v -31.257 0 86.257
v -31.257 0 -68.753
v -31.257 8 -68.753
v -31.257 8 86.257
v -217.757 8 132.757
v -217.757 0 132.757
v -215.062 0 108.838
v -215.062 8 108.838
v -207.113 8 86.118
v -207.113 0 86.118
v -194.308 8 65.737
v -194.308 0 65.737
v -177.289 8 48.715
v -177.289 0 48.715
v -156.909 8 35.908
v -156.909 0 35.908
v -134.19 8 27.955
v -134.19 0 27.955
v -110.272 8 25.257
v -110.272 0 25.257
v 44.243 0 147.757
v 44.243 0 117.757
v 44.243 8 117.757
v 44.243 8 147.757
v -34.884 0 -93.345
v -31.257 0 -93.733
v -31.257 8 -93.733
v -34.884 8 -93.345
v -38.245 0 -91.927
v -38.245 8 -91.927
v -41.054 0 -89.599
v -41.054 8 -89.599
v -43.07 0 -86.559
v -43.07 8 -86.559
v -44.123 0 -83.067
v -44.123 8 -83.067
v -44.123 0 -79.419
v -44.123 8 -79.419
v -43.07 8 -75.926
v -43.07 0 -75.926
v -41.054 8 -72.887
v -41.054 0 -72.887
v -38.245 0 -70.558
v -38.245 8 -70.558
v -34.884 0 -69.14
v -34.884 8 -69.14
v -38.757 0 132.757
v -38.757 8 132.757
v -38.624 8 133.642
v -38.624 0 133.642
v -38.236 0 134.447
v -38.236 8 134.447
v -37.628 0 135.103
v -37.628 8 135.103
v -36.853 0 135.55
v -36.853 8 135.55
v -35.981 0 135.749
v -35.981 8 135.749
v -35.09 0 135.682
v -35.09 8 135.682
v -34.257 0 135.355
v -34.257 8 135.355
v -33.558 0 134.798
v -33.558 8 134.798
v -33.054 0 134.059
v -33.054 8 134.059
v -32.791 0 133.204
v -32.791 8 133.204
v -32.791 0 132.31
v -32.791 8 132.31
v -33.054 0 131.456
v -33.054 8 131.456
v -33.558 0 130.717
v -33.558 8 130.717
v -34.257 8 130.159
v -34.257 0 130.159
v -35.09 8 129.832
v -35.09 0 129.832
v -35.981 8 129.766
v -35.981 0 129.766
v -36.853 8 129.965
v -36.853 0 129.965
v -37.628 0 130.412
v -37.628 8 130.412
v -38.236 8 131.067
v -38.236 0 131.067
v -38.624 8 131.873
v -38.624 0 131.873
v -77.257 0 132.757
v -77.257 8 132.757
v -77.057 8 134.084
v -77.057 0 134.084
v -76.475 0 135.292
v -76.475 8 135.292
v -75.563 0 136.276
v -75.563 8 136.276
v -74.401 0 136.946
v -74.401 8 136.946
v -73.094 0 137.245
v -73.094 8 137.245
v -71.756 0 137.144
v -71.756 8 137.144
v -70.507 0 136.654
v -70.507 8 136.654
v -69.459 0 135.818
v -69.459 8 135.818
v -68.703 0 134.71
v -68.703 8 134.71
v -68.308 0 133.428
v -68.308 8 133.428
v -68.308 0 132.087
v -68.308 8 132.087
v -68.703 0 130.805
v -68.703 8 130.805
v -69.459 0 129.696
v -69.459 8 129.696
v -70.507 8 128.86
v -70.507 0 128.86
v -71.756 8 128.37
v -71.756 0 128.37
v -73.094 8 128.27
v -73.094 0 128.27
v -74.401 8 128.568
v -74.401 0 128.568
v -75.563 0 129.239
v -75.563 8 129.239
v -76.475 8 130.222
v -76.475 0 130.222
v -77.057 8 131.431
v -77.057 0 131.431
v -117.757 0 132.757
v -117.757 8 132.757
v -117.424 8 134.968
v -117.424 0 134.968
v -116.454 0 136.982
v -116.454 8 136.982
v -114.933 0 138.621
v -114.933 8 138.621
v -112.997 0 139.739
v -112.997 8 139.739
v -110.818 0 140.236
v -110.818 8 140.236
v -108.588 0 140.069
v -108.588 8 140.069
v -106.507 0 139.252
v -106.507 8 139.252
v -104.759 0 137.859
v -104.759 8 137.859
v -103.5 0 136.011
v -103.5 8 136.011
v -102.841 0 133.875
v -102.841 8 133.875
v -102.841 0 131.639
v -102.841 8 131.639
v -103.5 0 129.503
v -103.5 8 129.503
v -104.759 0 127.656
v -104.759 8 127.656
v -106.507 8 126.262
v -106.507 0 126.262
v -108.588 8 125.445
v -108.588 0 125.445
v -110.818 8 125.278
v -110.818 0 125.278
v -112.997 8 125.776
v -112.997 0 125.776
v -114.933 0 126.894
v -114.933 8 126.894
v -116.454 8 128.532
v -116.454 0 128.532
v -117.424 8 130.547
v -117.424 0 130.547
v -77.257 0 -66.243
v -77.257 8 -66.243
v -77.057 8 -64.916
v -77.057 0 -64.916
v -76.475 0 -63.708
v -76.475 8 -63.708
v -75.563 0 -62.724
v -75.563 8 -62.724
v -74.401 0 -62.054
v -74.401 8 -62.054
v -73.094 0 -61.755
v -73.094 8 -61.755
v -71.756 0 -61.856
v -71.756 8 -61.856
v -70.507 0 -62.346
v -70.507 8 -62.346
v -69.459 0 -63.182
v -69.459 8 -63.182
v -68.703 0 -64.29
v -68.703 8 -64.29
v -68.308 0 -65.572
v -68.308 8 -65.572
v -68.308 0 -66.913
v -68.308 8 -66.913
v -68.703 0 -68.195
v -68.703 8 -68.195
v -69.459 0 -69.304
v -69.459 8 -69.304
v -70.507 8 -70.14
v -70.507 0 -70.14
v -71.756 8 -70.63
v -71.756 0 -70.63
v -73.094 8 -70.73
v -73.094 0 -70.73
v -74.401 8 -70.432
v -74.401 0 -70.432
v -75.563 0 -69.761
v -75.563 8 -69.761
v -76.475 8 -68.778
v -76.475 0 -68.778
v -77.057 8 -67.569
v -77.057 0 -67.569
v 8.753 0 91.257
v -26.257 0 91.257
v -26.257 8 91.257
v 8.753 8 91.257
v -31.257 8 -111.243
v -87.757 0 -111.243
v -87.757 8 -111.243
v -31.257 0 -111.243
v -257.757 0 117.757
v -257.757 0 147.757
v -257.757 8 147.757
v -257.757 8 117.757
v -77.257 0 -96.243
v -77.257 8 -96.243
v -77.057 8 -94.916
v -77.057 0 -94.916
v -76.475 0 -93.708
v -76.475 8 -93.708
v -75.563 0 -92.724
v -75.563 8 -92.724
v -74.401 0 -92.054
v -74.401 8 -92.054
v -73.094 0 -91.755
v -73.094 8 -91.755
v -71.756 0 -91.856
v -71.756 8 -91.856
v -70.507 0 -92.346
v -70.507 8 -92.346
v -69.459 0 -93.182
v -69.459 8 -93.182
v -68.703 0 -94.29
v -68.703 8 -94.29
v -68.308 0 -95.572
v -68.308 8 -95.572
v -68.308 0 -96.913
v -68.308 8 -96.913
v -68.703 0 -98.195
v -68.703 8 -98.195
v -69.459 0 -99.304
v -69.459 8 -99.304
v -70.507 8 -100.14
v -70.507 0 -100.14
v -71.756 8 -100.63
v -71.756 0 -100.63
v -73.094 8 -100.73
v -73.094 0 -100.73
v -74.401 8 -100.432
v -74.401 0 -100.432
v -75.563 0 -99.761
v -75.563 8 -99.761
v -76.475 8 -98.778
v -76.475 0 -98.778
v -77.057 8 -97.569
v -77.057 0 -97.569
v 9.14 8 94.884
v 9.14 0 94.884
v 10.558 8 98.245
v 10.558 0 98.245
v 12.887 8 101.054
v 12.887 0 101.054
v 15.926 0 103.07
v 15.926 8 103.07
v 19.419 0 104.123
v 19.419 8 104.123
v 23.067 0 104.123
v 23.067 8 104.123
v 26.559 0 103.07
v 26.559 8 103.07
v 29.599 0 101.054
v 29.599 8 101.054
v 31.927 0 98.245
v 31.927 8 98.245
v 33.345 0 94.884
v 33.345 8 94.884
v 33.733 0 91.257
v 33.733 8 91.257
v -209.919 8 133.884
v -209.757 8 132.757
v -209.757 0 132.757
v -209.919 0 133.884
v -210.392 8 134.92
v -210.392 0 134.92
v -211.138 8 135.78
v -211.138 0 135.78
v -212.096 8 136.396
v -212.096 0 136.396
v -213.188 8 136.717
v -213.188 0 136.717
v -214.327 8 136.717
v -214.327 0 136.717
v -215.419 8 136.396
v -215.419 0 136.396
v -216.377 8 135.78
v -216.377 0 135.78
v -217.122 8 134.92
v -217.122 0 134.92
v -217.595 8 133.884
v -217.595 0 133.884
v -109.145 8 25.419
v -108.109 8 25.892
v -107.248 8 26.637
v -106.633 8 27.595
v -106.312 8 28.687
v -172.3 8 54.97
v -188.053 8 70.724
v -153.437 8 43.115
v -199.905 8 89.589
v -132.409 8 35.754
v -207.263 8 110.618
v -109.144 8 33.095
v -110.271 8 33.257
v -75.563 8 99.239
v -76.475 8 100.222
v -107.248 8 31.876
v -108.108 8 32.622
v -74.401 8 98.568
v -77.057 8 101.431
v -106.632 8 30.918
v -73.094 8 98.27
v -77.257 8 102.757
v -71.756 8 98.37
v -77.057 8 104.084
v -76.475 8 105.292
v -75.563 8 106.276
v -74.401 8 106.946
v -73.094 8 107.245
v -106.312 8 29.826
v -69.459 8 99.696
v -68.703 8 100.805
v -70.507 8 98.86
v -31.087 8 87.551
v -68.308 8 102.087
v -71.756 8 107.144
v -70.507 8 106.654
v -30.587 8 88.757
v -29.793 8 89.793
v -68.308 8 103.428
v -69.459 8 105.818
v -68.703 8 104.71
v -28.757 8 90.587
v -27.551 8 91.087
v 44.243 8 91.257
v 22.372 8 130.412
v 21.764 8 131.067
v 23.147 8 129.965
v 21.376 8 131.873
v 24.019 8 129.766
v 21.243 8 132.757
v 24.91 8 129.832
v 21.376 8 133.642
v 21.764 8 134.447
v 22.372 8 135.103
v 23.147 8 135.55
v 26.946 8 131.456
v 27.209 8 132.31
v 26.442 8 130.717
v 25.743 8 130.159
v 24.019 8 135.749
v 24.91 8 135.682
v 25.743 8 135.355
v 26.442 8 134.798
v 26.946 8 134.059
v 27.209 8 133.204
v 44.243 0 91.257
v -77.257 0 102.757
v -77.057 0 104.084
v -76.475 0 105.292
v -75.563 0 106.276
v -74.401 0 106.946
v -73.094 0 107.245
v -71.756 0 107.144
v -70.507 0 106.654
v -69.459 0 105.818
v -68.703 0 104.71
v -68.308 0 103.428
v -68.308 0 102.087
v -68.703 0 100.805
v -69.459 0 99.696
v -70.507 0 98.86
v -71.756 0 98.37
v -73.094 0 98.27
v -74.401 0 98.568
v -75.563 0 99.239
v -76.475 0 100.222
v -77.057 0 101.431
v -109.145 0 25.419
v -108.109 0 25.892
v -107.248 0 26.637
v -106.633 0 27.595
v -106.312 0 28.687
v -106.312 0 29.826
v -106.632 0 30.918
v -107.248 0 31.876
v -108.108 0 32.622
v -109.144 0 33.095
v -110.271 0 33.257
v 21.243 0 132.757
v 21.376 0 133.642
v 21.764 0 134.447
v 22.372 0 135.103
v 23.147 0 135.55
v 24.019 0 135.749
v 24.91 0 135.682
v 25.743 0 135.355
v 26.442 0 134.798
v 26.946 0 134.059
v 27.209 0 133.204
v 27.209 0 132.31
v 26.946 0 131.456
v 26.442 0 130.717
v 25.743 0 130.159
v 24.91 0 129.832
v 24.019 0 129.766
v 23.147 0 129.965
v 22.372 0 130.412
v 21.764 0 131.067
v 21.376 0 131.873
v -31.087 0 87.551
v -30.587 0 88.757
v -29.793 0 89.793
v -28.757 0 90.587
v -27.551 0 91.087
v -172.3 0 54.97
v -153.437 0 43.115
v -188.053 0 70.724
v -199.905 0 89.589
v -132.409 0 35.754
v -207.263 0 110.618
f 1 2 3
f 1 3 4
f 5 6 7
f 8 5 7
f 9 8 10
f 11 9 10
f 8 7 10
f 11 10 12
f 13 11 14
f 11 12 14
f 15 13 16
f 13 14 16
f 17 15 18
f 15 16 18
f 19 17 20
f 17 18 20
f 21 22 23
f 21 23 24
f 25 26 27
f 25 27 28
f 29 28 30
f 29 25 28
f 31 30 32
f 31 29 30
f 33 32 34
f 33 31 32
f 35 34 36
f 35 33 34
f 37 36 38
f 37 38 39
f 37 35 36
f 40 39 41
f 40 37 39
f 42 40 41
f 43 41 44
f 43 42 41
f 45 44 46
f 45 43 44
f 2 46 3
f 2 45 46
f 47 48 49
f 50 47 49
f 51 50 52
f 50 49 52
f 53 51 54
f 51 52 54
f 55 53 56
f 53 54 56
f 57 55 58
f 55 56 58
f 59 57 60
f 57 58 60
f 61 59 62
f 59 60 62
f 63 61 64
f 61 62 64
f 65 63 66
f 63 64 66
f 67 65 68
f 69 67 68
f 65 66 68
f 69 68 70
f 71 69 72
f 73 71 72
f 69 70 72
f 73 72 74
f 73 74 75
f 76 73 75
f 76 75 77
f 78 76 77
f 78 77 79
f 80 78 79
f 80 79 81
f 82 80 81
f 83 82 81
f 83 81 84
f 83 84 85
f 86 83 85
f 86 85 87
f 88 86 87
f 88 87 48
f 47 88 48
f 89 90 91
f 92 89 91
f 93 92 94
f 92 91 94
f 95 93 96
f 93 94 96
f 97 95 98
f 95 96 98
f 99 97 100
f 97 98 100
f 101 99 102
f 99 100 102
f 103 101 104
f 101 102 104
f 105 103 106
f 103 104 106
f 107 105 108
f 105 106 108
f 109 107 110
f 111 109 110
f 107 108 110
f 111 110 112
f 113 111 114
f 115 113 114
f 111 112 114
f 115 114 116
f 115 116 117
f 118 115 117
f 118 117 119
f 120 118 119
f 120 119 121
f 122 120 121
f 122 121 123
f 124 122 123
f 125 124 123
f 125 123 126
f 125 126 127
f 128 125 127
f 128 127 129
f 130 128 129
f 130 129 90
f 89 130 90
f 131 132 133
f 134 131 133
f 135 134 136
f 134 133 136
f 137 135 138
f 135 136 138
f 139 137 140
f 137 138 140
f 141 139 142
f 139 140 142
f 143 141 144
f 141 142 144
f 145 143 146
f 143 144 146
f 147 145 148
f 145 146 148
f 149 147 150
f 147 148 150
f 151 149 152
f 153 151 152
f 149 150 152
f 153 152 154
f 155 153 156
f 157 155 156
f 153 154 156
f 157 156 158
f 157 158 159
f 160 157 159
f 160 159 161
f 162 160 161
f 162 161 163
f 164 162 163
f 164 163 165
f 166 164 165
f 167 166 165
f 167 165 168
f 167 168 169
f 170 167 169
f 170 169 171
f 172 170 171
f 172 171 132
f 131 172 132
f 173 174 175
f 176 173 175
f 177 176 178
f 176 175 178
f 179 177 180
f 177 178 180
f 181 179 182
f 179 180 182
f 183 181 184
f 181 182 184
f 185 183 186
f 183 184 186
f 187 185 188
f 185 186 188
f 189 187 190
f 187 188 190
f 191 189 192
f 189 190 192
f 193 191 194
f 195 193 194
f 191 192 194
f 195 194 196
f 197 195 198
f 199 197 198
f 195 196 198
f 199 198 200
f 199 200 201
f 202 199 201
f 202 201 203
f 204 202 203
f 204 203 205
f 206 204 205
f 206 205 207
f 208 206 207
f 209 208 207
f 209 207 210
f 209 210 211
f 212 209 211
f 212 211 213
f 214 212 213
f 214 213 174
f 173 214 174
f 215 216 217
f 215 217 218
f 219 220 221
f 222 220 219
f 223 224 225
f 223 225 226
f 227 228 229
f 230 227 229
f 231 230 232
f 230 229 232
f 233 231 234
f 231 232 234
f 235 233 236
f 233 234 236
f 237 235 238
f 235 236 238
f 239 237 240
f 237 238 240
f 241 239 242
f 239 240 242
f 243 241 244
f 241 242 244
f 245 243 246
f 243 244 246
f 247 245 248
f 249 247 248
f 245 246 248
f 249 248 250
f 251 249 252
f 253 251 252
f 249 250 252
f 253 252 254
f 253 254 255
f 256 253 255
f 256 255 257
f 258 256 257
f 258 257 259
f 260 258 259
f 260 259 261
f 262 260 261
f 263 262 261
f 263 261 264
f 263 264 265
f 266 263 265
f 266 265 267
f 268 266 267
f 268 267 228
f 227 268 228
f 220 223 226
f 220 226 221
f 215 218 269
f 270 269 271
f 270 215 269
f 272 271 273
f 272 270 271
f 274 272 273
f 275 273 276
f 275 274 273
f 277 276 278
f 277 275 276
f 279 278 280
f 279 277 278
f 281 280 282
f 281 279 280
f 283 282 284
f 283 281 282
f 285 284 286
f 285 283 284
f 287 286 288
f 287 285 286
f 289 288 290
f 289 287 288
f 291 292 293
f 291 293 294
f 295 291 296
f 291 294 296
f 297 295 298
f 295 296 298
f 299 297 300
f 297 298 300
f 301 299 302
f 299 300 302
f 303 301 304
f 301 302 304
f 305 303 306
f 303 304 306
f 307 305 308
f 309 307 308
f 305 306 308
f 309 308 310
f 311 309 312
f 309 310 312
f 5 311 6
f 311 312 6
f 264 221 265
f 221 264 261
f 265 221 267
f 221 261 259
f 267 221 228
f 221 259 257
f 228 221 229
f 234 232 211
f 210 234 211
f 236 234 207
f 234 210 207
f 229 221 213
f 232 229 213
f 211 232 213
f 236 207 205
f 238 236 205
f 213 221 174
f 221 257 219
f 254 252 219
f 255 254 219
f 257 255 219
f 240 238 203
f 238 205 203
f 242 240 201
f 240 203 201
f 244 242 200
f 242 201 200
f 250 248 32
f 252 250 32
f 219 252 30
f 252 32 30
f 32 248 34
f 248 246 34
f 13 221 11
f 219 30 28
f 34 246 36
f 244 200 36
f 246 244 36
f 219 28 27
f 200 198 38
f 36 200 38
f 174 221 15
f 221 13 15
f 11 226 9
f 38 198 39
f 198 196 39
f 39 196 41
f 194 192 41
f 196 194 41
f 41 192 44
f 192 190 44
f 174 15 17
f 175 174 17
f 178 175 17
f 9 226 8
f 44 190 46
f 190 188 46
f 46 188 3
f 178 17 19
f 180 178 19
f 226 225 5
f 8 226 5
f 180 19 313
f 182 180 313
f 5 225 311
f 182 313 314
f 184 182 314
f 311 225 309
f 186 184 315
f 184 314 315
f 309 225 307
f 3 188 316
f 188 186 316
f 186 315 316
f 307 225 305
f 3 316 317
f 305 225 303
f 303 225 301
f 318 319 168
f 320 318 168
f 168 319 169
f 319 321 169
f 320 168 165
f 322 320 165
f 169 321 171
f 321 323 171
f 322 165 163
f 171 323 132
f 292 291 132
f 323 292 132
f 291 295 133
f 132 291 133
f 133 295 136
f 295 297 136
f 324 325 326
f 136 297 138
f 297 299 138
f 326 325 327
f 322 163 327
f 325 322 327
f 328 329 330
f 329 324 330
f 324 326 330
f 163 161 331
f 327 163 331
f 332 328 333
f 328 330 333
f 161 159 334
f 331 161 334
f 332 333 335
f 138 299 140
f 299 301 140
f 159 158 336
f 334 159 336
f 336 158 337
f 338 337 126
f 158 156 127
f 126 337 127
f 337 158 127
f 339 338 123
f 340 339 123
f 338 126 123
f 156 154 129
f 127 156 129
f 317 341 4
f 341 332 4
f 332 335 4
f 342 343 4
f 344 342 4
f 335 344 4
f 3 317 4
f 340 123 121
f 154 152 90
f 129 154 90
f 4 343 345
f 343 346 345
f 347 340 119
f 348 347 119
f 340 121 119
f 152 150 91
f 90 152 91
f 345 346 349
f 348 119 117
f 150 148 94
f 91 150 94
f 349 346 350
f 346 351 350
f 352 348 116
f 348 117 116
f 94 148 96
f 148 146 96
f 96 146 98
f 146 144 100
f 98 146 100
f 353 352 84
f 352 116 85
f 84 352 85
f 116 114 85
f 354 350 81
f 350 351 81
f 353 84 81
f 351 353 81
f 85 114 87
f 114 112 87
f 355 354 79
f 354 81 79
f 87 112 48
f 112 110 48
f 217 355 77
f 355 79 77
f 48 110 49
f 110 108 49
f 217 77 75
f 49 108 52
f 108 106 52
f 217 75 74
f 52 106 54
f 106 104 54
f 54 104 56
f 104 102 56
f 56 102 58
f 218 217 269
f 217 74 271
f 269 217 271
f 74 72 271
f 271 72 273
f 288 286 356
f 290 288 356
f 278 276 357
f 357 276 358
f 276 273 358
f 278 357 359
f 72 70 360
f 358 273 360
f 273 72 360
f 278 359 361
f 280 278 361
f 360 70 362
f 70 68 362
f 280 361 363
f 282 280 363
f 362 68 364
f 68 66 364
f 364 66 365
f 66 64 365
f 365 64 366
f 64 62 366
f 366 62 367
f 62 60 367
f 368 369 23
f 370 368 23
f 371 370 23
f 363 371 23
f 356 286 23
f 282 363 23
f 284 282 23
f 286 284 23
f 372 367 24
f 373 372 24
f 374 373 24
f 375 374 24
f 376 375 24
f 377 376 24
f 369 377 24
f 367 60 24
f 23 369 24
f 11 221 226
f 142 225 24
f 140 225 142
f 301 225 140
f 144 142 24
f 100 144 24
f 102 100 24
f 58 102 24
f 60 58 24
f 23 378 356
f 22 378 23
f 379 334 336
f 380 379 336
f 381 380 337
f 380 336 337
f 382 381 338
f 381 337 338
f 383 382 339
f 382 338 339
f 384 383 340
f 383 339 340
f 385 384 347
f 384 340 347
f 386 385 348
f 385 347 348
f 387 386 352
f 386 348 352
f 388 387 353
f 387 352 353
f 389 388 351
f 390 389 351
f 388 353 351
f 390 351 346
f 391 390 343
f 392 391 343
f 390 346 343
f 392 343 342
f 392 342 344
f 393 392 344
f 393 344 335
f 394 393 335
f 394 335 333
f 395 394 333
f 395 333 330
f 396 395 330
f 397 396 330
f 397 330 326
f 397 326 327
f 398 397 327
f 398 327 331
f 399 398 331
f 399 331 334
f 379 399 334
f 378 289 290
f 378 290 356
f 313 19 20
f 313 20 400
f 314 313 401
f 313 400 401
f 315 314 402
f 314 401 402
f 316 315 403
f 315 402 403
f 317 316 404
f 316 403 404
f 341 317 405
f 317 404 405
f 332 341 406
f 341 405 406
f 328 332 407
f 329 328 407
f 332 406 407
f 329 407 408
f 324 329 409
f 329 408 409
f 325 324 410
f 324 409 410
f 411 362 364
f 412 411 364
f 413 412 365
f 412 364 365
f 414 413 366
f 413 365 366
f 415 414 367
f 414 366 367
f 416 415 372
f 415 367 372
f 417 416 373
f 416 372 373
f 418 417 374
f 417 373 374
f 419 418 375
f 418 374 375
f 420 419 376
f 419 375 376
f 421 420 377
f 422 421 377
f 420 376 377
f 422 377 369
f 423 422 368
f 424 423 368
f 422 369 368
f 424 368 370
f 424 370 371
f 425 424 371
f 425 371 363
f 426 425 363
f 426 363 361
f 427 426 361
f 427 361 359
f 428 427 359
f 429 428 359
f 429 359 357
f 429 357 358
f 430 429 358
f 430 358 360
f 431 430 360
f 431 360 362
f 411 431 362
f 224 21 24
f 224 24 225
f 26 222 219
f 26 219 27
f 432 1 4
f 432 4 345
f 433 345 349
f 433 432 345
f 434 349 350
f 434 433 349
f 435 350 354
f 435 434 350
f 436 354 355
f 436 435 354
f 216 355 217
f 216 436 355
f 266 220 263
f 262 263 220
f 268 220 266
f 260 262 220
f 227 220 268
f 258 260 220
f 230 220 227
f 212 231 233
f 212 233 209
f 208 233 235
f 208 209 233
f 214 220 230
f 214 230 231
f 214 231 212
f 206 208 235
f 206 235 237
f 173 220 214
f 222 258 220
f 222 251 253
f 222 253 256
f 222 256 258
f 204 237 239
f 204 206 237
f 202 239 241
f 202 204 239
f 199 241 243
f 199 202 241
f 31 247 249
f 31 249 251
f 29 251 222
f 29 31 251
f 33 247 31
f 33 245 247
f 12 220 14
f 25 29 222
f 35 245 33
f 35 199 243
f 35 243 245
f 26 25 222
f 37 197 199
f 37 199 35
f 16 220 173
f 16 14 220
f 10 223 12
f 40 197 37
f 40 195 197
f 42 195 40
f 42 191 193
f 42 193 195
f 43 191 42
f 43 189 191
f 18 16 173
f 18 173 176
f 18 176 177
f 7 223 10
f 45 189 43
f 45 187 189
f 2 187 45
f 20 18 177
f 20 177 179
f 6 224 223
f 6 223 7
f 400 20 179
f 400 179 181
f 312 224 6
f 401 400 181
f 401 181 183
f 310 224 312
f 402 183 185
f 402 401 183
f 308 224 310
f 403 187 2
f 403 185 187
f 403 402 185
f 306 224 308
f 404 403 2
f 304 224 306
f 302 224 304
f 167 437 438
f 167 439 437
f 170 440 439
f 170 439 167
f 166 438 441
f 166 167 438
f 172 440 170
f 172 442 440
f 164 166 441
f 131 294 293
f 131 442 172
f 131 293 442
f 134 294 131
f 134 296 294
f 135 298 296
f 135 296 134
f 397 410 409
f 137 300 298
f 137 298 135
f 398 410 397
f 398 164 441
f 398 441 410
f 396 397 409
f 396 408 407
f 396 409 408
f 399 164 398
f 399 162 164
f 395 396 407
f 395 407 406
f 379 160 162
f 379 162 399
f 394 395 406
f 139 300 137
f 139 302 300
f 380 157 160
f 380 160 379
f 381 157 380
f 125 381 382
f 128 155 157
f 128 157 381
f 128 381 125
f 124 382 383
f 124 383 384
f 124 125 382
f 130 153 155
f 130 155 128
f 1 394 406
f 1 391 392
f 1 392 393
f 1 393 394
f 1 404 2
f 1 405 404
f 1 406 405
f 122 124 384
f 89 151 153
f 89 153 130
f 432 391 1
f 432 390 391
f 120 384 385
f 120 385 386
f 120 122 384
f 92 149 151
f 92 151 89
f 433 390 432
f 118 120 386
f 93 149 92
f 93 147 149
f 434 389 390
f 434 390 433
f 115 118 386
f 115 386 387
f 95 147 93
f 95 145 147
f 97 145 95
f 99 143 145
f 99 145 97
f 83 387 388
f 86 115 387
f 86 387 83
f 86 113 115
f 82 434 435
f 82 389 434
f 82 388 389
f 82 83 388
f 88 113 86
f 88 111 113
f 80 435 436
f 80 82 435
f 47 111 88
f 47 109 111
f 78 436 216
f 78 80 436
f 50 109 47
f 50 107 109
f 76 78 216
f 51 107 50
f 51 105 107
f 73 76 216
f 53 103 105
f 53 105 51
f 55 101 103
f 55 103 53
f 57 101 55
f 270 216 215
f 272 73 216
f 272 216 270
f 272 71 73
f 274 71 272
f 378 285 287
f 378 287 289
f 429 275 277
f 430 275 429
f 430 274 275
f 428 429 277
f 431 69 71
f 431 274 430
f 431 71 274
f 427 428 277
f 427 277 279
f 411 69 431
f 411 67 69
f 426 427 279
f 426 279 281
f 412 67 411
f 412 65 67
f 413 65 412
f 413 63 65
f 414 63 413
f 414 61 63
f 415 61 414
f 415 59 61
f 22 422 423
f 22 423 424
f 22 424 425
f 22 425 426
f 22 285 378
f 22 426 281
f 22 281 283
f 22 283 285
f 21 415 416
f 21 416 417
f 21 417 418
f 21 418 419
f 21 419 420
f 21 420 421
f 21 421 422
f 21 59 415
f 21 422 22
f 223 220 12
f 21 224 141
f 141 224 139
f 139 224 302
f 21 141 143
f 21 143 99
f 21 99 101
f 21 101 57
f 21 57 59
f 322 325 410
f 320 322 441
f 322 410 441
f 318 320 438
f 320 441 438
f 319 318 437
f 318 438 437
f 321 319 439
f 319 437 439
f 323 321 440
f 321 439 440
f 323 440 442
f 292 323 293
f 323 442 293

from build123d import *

# Parameters (mm, degrees)
F2_DEPTH = 8
F4_D     = 15
F6_D     = 9
F8_DEPTH = 25
F9_D     = 6


with BuildPart() as f2:
    # F1 (on Front) → F2 (new body)
    with BuildSketch(Plane.XZ):
        with BuildLine():
            Line((-257.7572688935, 147.7572688894), (-257.7572688935, 117.7572688894))
            Line((-257.7572688935, 117.7572688894), (-87.7572688935, -111.2427311235))
            Line((-87.7572688935, -111.2427311235), (-57.7572688935, -111.2427311235))
            Line((-57.7572688935, -111.2427311235), (-31.2572688938, -111.2427311235))
            Line((-31.2572688938, -111.2427311235), (-31.2572688938, -93.7327271198))
            ThreePointArc((-31.2572688938, -93.7327271198), (-44.2572688934, -81.2427311229), (-31.2572688938, -68.7527351261))
            Line((-31.2572688938, -68.7527351261), (-31.2572688938, 86.2572688893))
            ThreePointArc((-31.2572688938, 86.2572688893), (-29.7928027997, 89.7928027952), (-26.2572688938, 91.2572688893))
            Line((-26.2572688938, 91.2572688893), (8.7527351631, 91.2572688893))
            ThreePointArc((8.7527351631, 91.2572688893), (21.2427311599, 104.2572688889), (33.7327271567, 91.2572688893))
            Line((33.7327271567, 91.2572688893), (44.2427311605, 91.2572688893))
            Line((44.2427311605, 91.2572688893), (44.2427311606, 117.757268889))
            Line((44.2427311606, 117.757268889), (44.2427311606, 147.7572688894))
            Line((44.2427311606, 147.7572688894), (-257.7572688935, 147.7572688894))
        make_face()
    extrude(amount=-F2_DEPTH)

    # F4 (through all)
    with Locations(Plane.XZ):
        with Locations((-110.2572688394, 132.7572688894)):
            Hole(F4_D / 2)

    # F6 (through all)
    with Locations(Plane.XZ):
        with Locations((-72.7572688936, -66.2427311235), (-72.7572688936, -96.2427311235), (-72.7572688936, 132.7572688894), (-72.7572688936, 102.7572688894)):
            Hole(F6_D / 2)

    # F7 (on face) → F8 (cut)
    with BuildSketch(Plane.XZ):
        with BuildLine():
            ThreePointArc((-110.2705276792, 33.2572697728), (-180.6190811191, 62.4048320253), (-209.7572688394, 132.7572688894))
            ThreePointArc((-209.7572688394, 132.7572688894), (-213.7572688394, 136.7572688894), (-217.7572688394, 132.7572688894))
            ThreePointArc((-217.7572688394, 132.7572688894), (-186.2763122571, 56.7483546894), (-110.2715937166, 25.2572698438))
            ThreePointArc((-110.2715937166, 25.2572698438), (-106.2710607334, 29.2567367896), (-110.2705276792, 33.2572697728))
        make_face()
    extrude(amount=-F8_DEPTH, mode=Mode.SUBTRACT)

    # F9 (through all)
    with Locations(Plane.XZ):
        with Locations((-35.7572688394, 132.7572688894), (24.2427311606, 132.7572688894)):
            Hole(F9_D / 2)


solid = f2.part
